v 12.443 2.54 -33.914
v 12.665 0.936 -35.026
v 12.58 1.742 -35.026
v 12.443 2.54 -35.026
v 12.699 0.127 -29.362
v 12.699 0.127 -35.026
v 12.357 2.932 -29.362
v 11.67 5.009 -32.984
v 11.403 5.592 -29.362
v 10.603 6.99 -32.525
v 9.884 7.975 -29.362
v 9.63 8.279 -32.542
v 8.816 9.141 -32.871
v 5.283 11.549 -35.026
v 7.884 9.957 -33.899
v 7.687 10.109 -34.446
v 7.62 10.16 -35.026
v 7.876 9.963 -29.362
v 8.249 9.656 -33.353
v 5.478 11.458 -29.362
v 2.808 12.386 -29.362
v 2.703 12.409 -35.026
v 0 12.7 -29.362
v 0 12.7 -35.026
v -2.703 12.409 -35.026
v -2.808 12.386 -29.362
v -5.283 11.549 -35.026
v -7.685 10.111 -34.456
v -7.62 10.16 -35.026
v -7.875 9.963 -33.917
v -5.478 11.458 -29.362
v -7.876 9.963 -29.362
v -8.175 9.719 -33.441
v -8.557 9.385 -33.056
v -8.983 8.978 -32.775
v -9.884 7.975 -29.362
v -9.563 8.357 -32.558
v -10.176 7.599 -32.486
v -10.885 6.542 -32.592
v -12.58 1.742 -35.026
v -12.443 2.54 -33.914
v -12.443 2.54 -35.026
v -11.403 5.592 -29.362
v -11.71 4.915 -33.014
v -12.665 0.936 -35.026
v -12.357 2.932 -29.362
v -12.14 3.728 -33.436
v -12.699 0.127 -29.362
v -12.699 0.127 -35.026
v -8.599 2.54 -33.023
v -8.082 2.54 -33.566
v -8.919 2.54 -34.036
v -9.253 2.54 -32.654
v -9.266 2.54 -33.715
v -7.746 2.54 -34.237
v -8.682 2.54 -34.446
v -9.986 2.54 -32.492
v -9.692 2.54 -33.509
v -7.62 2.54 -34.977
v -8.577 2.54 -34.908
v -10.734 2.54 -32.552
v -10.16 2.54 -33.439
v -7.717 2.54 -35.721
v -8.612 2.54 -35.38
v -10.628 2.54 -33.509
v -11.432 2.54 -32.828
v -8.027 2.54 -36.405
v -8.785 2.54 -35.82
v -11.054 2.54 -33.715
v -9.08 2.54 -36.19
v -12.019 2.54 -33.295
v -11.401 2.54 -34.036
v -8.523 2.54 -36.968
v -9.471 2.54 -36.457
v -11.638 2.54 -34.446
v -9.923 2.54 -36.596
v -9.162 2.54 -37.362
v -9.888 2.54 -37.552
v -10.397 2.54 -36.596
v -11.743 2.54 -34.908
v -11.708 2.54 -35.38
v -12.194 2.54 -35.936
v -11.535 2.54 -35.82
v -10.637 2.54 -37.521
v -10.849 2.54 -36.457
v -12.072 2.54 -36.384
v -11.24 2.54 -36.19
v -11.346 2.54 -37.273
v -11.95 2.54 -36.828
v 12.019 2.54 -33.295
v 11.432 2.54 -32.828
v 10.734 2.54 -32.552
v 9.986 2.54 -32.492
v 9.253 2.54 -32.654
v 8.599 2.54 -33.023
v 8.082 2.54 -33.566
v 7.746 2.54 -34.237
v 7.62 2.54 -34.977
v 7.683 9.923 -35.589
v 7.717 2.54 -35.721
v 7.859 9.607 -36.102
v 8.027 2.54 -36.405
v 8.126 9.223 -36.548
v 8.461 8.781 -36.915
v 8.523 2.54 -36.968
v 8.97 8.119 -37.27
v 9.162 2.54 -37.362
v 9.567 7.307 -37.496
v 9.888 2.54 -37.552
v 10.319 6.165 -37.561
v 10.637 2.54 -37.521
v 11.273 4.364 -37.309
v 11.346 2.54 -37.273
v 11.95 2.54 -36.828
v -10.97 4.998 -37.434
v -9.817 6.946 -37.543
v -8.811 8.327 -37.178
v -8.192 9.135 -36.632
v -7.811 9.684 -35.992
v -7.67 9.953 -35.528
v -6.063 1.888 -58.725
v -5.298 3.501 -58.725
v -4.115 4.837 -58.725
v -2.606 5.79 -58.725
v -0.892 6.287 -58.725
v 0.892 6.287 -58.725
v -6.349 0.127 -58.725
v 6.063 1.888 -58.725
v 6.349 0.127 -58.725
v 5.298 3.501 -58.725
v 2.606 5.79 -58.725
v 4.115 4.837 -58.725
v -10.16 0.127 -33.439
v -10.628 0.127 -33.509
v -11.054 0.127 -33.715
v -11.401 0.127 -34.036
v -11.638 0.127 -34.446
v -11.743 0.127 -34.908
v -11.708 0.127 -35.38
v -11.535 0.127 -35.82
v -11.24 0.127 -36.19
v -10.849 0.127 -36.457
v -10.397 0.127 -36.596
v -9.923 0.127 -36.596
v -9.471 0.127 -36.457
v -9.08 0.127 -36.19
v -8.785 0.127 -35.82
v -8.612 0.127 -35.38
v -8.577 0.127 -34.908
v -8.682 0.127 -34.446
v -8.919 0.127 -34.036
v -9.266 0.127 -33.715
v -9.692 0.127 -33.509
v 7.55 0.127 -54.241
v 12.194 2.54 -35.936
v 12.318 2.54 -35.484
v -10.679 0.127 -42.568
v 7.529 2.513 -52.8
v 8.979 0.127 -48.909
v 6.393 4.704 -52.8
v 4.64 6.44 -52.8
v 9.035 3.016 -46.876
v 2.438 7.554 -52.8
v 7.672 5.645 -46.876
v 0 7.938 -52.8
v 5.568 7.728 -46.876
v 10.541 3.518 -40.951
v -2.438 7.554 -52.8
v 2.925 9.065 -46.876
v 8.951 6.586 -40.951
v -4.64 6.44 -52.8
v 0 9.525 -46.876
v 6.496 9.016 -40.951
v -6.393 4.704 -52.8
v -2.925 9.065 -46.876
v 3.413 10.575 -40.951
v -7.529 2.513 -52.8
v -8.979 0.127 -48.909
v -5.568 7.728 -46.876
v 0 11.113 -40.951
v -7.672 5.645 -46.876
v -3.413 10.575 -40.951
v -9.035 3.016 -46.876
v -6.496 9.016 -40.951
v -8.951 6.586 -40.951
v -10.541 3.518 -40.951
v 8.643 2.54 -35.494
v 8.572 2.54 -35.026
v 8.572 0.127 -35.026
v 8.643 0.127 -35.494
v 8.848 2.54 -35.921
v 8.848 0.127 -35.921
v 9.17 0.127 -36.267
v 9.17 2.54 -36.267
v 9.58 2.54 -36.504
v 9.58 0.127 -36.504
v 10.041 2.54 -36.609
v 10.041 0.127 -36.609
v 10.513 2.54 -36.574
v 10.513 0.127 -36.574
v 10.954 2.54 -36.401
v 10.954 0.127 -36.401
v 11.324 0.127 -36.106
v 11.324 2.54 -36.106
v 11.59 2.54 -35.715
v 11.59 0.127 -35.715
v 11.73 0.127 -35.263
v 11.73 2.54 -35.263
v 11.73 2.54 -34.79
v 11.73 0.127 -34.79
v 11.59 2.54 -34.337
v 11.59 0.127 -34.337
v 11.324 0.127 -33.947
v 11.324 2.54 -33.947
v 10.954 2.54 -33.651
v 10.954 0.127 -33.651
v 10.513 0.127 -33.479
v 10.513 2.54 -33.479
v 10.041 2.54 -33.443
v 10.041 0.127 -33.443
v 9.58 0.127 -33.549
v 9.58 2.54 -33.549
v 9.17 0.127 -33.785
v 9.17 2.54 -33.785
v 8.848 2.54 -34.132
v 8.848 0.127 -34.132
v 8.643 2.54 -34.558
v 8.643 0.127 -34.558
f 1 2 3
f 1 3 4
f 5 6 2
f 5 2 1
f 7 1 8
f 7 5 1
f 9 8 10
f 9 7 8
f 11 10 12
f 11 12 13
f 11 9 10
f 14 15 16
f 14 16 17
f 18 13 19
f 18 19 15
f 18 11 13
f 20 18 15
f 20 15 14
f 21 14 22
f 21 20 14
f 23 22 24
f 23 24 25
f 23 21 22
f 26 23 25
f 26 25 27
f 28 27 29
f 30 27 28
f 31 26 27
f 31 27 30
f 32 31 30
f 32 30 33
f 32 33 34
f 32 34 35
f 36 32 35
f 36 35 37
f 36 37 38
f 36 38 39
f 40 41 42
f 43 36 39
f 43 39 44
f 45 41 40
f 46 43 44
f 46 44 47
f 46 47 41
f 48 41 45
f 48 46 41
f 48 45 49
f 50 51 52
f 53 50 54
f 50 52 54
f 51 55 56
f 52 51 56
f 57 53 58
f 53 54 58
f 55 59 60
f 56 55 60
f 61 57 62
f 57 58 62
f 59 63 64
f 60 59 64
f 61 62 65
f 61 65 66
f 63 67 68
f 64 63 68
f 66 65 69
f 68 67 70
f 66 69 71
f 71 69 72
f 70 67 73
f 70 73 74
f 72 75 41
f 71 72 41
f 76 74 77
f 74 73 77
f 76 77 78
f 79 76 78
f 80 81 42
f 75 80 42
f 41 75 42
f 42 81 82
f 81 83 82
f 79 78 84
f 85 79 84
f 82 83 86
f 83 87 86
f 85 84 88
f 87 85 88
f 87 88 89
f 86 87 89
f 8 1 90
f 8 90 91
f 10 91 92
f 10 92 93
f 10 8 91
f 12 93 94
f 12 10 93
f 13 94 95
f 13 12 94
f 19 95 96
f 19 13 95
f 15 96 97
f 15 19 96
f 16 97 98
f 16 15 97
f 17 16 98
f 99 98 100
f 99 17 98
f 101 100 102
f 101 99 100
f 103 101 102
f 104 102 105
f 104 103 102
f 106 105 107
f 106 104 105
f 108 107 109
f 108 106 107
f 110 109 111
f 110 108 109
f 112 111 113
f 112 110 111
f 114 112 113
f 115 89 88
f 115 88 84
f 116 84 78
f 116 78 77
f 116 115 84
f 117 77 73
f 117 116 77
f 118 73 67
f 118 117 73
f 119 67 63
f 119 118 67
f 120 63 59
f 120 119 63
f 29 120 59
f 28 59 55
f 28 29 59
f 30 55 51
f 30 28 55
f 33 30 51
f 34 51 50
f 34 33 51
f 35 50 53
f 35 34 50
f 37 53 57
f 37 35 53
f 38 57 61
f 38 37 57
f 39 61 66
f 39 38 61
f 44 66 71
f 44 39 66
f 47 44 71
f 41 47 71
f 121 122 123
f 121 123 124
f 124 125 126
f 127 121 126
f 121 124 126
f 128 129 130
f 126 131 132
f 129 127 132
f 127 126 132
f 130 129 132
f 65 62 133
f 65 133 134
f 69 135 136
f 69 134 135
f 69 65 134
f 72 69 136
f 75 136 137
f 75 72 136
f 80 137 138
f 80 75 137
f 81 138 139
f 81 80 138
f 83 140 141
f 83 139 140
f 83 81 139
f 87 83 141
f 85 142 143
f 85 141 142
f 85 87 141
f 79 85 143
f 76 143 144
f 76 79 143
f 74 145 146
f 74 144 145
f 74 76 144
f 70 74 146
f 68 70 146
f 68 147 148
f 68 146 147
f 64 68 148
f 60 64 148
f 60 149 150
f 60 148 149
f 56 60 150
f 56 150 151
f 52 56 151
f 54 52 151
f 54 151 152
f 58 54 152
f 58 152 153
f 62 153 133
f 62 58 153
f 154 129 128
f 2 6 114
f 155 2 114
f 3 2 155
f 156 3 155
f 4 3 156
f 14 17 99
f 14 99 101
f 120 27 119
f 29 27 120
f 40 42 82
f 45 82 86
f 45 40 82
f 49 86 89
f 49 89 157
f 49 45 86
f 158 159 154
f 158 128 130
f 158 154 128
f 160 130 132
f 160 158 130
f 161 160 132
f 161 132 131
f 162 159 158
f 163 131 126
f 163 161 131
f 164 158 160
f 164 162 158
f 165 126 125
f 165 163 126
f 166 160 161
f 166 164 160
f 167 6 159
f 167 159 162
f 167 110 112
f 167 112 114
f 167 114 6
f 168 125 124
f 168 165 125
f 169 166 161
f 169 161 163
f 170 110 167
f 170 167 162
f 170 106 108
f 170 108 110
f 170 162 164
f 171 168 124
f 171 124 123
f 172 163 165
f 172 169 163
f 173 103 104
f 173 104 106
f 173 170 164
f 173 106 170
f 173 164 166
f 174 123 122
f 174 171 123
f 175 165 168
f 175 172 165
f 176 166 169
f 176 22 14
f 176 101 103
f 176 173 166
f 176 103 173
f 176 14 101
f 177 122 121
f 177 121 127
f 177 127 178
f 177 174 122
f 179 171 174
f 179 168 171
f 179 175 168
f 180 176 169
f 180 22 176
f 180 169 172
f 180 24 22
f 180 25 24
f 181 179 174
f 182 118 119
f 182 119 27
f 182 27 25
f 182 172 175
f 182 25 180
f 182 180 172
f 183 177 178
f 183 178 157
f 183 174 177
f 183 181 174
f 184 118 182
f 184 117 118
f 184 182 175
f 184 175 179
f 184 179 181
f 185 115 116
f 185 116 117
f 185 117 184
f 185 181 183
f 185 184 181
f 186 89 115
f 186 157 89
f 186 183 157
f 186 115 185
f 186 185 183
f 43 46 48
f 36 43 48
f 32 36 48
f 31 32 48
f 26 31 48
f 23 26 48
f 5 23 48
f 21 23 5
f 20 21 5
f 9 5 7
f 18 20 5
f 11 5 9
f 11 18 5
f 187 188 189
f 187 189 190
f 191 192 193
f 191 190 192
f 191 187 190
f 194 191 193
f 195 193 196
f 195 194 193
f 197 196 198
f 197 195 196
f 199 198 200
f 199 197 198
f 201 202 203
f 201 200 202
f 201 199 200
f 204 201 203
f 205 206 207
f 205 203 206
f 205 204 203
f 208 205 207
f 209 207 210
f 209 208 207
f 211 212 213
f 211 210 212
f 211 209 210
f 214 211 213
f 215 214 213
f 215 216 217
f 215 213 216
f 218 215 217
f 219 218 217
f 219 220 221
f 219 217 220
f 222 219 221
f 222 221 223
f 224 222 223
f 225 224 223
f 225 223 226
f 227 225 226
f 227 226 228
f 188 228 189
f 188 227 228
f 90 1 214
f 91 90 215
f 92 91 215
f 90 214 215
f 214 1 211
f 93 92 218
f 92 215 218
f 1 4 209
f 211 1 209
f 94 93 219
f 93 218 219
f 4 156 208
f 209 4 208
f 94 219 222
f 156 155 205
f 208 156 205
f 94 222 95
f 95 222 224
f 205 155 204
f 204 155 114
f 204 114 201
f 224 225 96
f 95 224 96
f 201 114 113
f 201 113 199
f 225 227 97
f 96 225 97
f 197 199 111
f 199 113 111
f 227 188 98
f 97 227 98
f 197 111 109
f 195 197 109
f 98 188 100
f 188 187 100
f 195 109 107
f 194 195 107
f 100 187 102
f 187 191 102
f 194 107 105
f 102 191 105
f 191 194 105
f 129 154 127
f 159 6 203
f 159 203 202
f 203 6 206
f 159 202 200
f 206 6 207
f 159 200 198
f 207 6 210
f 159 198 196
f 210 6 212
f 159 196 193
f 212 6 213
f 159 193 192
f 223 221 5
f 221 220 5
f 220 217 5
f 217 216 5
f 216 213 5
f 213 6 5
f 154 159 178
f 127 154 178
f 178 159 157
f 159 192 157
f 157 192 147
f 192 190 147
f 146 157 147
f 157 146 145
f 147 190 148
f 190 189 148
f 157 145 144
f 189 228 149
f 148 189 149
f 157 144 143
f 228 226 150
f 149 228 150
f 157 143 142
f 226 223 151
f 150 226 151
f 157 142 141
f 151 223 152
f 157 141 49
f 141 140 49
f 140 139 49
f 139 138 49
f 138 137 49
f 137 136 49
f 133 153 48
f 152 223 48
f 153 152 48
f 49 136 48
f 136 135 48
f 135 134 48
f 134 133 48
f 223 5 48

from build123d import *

# Parameters (mm, degrees)
SKETCH1_R           = 12.7
BOSS_EXTRUDE1_DEPTH = 58.7248
CHAMFER3_SIZE       = 6.35
CHAMFER3_SIZE2      = 23.698522628
CHAMFER4_SIZE       = 6.35
CHAMFER4_SIZE2      = 23.698522628
CUT_EXTRUDE1_DEPTH  = 58.7248
CUT_EXTRUDE2_DEPTH  = 58.7248
CUT_EXTRUDE3_DEPTH  = 35.419680486
SKETCH5_R           = 1.5875
CUT_EXTRUDE4_DEPTH  = 62.383681342
SKETCH6_R           = 2.54
CUT_EXTRUDE5_DEPTH  = 10.16


with BuildPart() as part:
    # Sketch1 → Boss-Extrude1 (new body)
    with BuildSketch(Plane.XY):
        Circle(SKETCH1_R)
    extrude(amount=-BOSS_EXTRUDE1_DEPTH)

    # Chamfer3
    chamfer3_edges = [part.edges().sort_by_distance(p)[0] for p in [
        (-12.7, 0, -58.7248),
    ]]
    chamfer3_side = [part.faces().sort_by_distance(p)[0] for p in [
        (0, 0, -58.7248),
    ]]
    chamfer(chamfer3_edges, length=CHAMFER3_SIZE, length2=CHAMFER3_SIZE2, reference=chamfer3_side[0])

    # Chamfer4
    chamfer4_edges = [part.edges().sort_by_distance(p)[0] for p in [
        (-12.7, 0, 0),
    ]]
    chamfer4_side = [part.faces().sort_by_distance(p)[0] for p in [
        (0, 0, 0),
    ]]
    chamfer(chamfer4_edges, length=CHAMFER4_SIZE, length2=CHAMFER4_SIZE2, reference=chamfer4_side[0])

    # Sketch2 → Cut-Extrude1 (cut)
    with BuildSketch(Plane(origin=(0, 0, 0), x_dir=(1, 0, 0), z_dir=(0, 1, 0))):
        Polygon((-6.35, 0), (-12.7, 23.698522628), (-12.7, 35.026277372), (-6.35, 58.7248), (6.35, 58.7248), (12.7, 35.026277372), (12.7, 23.698522628), (6.35, 0), align=None)
    extrude(amount=-CUT_EXTRUDE1_DEPTH, mode=Mode.SUBTRACT)

    # Sketch3 → Cut-Extrude2 (cut)
    with BuildSketch(Plane.XY):
        with BuildLine():
            Line((-12.7, 0), (12.7, 0))
            ThreePointArc((12.7, 0), (12.699841245, 0.063500794), (12.699364984, 0.127))
            Line((12.699364984, 0.127), (0, 0.127))
            Line((0, 0.127), (-12.699364984, 0.127))
            ThreePointArc((-12.699364984, 0.127), (-12.699841245, 0.063500794), (-12.7, 0))
        make_face()
    extrude(amount=-CUT_EXTRUDE2_DEPTH, mode=Mode.SUBTRACT)

    # Sketch4 → Cut-Extrude3 (cut, through all)
    with BuildSketch(Plane(origin=(0, 0, -29.3624), x_dir=(-1, 0, 0), z_dir=(0, 0, -1))):
        with BuildLine():
            Line((0, 0.127), (-12.699364984, 0.127))
            ThreePointArc((-12.699364984, 0.127), (0, 12.826364984), (12.699364984, 0.127))
            Line((12.699364984, 0.127), (0, 0.127))
        make_face()
    extrude(amount=-CUT_EXTRUDE3_DEPTH, mode=Mode.SUBTRACT)

    # Sketch5 → Cut-Extrude4 (cut, through all)
    with BuildSketch(Plane(origin=(0, 12.7, 0), x_dir=(-1, 0, 0), z_dir=(0, -1, 0))):
        with Locations((-10.16, 35.026277372)):
            Circle(SKETCH5_R)
        with Locations(Location((10.16, 35.026277372, 0), (0, 0, 270))):
            Circle(SKETCH5_R)
    extrude(amount=CUT_EXTRUDE4_DEPTH, mode=Mode.SUBTRACT)

    # Sketch6 → Cut-Extrude5 (cut)
    with BuildSketch(Plane(origin=(0, 12.7, 0), x_dir=(-1, 0, 0), z_dir=(0, -1, 0))):
        with Locations((-10.16, 35.026277372)):
            Circle(SKETCH6_R)
        with Locations((10.16, 35.026277372)):
            Circle(SKETCH6_R)
    extrude(amount=CUT_EXTRUDE5_DEPTH, mode=Mode.SUBTRACT)


solid = part.part
